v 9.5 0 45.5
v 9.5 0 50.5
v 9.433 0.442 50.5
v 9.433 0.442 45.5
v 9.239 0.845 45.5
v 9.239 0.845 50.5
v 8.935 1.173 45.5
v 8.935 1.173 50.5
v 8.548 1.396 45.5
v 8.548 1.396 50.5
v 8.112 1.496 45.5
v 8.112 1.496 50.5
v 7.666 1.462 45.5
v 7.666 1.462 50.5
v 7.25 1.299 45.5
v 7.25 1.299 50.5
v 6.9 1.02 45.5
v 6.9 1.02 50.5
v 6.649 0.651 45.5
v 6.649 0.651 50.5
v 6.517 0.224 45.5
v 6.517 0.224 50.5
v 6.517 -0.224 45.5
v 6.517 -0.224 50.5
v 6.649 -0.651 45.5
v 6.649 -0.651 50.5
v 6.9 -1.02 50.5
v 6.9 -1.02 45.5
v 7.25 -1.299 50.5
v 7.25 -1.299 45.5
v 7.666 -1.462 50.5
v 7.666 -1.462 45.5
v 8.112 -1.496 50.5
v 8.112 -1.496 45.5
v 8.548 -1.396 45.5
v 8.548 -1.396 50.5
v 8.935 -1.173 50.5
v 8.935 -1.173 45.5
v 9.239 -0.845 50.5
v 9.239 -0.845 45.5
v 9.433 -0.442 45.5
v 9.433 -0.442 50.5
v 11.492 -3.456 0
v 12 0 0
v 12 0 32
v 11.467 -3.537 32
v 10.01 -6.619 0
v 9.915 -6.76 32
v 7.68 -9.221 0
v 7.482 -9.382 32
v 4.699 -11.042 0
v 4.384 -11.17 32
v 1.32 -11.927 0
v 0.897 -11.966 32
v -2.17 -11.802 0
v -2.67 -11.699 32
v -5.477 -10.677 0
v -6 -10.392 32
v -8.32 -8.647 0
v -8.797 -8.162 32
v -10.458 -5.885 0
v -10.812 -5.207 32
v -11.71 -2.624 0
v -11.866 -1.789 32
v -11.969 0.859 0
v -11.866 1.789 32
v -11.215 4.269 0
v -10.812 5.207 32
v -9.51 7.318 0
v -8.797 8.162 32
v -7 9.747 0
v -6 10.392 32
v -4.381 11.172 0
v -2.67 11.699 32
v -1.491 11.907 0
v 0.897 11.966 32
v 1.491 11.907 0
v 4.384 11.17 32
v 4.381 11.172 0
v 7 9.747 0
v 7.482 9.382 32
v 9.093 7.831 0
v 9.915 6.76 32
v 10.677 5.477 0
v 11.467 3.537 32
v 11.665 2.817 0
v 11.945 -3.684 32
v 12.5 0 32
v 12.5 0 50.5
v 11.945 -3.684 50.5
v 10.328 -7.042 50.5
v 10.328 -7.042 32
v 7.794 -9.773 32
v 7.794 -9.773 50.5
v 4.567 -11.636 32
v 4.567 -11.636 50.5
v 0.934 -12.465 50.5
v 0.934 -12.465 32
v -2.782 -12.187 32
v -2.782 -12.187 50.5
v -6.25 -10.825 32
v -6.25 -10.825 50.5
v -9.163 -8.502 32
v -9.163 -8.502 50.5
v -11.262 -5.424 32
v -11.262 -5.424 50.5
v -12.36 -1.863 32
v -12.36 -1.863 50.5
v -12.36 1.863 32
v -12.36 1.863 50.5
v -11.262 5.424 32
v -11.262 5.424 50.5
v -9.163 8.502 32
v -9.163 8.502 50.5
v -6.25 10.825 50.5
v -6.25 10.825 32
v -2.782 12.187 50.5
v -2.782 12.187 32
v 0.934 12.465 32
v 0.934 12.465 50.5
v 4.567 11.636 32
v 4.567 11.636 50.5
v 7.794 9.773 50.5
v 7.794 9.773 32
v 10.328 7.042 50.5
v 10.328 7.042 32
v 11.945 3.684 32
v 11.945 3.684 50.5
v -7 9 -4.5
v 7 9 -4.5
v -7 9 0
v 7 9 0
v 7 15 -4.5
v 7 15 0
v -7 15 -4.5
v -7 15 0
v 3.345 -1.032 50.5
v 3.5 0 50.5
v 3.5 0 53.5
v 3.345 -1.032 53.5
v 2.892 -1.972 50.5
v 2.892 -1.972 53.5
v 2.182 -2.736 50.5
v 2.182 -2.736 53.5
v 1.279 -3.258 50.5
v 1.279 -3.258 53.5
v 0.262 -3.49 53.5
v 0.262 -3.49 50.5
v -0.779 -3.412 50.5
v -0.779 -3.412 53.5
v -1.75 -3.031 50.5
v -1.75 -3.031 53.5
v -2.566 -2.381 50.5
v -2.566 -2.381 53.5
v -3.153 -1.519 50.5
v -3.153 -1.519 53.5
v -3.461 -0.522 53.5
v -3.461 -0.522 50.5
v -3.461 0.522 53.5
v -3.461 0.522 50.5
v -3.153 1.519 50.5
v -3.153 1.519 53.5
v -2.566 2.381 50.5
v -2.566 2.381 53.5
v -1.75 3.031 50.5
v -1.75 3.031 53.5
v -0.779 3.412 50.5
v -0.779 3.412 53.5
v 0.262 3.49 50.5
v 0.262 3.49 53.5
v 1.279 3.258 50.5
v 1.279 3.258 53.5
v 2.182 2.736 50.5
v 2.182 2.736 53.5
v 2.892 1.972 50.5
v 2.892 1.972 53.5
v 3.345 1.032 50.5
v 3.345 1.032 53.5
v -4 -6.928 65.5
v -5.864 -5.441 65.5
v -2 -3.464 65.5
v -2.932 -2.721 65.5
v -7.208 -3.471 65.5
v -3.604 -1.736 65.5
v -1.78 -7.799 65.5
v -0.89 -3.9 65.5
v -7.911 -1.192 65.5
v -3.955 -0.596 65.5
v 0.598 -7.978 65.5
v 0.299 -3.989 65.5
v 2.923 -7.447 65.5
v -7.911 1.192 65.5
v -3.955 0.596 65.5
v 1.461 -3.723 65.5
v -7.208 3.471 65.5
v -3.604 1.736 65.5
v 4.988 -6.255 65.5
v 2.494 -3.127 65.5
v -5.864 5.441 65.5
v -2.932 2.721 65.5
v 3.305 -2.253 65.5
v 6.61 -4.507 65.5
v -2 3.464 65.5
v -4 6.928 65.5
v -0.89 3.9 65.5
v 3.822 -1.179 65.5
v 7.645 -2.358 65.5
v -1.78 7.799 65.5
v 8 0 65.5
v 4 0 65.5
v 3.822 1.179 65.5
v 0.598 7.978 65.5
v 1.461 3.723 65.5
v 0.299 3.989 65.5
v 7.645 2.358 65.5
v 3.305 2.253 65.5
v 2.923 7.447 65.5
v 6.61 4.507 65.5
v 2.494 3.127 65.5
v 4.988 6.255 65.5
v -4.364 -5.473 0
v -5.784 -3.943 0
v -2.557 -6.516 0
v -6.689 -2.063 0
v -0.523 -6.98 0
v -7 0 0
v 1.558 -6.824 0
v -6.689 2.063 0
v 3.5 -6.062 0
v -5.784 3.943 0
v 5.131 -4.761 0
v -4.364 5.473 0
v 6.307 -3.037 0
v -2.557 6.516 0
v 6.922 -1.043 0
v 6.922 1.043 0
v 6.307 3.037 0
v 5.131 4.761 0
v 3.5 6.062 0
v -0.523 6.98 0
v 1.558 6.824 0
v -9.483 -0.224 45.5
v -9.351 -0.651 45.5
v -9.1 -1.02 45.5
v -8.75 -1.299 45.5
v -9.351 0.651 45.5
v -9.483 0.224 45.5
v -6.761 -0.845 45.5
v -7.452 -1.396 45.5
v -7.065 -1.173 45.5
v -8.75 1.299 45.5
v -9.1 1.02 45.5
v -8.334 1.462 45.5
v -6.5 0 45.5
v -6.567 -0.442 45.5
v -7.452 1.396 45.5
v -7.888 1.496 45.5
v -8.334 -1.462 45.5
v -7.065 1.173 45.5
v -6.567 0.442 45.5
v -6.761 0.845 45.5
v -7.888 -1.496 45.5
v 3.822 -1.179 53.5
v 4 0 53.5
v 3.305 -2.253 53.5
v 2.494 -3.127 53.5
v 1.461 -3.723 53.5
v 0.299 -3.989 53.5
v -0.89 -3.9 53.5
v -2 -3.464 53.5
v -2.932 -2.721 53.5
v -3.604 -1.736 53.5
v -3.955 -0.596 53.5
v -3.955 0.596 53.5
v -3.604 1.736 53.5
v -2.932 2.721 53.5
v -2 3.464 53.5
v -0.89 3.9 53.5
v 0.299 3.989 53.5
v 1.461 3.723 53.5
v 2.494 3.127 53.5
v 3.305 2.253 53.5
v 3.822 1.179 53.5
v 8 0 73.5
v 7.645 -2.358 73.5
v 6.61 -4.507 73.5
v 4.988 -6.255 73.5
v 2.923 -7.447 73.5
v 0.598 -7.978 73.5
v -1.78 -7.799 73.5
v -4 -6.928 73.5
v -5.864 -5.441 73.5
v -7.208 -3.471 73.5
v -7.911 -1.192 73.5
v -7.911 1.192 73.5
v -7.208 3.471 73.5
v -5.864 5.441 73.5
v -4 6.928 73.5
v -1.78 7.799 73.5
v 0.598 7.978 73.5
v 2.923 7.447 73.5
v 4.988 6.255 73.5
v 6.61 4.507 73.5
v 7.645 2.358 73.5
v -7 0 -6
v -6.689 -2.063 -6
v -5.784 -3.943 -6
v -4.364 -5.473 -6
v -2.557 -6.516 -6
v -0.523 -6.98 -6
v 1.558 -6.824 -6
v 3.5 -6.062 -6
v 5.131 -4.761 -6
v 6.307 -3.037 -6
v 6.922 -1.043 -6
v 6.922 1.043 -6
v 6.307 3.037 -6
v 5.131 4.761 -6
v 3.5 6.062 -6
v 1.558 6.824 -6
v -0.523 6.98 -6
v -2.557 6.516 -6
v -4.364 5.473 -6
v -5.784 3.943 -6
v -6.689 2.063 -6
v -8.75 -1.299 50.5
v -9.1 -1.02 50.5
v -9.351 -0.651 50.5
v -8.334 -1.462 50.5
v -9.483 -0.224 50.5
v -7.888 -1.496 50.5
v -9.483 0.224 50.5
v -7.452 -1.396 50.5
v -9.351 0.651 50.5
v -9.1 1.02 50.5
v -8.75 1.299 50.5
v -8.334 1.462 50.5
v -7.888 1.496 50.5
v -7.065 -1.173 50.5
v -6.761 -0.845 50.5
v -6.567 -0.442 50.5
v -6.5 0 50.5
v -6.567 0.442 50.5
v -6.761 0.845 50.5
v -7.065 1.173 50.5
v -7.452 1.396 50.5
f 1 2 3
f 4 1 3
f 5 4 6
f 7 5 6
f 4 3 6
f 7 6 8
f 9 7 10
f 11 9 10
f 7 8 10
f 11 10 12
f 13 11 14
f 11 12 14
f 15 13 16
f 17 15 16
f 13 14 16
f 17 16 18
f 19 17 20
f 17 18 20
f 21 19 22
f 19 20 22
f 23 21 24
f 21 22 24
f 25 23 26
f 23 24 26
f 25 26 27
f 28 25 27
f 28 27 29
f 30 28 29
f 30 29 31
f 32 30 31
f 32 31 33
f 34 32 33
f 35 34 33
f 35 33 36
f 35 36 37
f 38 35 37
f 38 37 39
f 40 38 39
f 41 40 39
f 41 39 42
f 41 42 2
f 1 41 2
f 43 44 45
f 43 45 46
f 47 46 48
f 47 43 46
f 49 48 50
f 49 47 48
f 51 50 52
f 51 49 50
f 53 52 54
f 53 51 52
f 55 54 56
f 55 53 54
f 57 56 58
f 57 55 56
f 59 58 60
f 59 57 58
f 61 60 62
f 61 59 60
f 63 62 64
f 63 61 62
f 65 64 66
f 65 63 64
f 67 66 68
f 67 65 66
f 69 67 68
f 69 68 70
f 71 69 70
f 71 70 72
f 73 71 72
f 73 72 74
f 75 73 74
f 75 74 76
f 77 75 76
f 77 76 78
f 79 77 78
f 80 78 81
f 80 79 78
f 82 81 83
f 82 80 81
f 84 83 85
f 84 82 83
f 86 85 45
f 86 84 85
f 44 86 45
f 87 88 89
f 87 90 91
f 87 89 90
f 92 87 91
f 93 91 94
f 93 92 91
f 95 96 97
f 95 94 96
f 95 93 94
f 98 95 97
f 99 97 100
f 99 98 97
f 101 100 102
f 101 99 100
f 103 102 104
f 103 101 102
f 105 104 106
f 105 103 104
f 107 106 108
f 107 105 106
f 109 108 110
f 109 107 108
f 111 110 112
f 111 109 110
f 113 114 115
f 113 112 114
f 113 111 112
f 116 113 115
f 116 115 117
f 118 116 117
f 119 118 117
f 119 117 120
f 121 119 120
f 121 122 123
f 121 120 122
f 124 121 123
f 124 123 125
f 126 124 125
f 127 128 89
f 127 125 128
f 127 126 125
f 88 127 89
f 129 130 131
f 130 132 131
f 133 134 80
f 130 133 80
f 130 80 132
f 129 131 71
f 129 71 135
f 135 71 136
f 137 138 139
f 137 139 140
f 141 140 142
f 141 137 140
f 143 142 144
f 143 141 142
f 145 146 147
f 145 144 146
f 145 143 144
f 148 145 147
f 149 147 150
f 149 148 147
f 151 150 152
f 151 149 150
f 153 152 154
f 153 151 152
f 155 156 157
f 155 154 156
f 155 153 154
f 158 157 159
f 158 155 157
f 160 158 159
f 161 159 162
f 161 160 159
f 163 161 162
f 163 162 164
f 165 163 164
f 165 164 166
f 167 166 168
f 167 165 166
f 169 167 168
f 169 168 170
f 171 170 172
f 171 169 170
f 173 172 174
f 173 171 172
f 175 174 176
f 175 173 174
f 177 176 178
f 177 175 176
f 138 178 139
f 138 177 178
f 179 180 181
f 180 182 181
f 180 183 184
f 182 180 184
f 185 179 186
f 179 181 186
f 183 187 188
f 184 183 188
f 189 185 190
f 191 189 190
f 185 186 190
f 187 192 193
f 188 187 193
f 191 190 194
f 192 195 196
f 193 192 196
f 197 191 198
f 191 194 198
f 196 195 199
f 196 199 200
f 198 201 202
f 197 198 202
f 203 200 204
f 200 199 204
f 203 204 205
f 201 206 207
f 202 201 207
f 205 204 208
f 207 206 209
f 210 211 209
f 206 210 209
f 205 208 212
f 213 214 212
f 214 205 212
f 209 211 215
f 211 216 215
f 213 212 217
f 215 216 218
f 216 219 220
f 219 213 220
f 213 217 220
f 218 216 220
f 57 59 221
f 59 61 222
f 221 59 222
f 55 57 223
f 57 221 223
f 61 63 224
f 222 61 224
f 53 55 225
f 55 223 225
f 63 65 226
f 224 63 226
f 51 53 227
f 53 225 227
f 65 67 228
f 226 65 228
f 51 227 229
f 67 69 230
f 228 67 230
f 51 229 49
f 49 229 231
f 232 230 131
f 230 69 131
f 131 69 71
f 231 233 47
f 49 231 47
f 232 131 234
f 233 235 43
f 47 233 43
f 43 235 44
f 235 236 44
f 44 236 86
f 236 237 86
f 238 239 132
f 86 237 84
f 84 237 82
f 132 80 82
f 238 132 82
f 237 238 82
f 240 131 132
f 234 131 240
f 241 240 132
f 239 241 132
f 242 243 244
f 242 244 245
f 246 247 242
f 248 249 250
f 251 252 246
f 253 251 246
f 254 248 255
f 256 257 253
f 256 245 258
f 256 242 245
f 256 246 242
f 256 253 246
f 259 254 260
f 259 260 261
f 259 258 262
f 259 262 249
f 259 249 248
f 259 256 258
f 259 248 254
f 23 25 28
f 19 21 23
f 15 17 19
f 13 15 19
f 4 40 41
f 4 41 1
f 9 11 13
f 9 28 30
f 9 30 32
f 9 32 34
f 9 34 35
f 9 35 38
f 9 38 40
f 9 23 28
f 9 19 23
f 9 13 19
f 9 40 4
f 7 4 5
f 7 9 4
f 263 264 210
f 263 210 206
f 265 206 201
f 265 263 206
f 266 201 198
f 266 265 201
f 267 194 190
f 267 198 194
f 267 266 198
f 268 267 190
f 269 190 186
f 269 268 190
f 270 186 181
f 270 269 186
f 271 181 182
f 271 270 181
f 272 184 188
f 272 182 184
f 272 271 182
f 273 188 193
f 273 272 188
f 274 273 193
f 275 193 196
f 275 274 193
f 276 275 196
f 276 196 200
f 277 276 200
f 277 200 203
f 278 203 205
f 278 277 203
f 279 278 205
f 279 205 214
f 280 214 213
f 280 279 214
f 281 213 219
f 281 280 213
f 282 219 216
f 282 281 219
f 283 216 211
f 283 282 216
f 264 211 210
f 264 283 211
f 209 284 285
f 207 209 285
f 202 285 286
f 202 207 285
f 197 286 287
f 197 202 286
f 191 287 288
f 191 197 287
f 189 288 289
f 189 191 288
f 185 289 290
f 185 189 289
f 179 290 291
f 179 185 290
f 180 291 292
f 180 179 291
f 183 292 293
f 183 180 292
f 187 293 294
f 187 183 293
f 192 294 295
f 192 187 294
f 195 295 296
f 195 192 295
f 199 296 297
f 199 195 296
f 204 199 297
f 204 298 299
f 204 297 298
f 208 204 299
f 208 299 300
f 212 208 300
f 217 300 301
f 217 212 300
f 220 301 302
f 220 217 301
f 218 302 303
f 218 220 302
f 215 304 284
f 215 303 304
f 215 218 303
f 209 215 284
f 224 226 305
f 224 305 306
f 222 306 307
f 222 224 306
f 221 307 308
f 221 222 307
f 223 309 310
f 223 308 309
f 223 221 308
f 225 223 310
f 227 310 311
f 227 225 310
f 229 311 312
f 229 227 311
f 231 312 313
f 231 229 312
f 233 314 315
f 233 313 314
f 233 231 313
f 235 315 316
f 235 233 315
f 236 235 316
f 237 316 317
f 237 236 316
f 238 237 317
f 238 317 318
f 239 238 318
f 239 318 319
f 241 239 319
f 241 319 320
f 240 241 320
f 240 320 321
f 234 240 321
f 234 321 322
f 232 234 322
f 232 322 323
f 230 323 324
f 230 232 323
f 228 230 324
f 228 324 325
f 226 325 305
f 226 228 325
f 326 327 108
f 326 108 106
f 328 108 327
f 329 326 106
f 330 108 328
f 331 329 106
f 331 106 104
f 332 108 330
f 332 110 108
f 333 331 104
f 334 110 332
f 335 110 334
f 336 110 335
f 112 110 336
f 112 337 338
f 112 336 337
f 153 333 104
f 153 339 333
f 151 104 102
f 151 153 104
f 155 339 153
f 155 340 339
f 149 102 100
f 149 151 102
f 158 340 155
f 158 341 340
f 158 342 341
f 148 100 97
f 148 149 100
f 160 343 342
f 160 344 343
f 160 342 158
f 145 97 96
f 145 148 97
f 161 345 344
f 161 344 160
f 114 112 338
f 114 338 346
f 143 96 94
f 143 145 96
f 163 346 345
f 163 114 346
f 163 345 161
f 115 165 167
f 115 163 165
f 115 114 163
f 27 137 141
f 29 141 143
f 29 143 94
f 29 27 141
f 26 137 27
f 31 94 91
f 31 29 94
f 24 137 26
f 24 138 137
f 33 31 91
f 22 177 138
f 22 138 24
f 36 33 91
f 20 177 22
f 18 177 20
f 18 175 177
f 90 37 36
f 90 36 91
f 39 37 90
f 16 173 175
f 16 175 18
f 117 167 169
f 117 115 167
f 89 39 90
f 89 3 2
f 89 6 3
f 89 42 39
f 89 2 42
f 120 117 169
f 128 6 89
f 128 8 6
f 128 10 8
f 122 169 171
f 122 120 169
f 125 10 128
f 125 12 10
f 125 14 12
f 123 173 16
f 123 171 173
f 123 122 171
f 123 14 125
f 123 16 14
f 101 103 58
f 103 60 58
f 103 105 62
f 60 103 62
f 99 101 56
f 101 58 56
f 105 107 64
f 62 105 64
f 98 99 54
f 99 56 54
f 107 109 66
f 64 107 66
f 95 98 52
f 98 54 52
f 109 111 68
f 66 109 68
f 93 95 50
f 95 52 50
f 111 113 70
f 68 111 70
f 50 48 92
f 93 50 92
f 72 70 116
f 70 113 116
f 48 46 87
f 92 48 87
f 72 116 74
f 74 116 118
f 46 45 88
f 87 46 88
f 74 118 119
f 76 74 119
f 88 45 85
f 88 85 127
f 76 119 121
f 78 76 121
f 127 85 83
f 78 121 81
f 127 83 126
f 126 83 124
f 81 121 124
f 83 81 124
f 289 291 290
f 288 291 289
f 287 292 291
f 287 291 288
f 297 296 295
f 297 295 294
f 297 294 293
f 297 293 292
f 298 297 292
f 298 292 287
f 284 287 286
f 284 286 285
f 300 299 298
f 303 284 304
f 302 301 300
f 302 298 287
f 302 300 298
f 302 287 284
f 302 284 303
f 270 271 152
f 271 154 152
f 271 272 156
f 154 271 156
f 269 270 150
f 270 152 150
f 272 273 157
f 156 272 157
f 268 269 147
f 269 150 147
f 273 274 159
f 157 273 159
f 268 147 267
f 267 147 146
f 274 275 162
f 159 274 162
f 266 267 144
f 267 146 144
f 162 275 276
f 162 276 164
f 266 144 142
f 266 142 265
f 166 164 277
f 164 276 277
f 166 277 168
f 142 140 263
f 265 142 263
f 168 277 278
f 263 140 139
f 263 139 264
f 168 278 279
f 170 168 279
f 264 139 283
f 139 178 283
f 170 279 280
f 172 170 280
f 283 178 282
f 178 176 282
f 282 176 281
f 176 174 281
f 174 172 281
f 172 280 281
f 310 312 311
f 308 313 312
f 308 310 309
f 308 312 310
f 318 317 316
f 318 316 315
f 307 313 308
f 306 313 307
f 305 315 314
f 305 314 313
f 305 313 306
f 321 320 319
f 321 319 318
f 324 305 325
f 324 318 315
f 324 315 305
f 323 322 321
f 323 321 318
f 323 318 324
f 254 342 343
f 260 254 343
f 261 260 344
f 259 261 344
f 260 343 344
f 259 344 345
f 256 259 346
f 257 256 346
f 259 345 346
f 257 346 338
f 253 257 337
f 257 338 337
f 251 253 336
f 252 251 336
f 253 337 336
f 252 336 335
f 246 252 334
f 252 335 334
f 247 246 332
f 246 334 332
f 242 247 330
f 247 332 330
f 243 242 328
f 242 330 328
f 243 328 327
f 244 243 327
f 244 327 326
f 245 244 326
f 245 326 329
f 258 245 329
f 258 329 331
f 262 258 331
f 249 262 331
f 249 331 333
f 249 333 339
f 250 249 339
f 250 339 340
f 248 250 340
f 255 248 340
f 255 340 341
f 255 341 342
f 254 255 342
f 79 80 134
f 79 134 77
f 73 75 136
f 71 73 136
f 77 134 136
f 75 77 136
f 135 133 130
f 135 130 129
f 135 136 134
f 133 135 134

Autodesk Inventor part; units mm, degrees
ref_plane "YZ Plane" through (0, 0, 0) normal (1, 0, 0) x (0, 1, 0)
ref_plane "XZ Plane" through (0, 0, 0) normal (0, 1, 0) x (-1, 0, 0)
ref_plane "XY Plane" through (0, 0, 0) normal (0, 0, 1) x (1, 0, 0)
sketch "Sketch1" plane through (0, 0, 0) normal (0, 0, 1) x (1, 0, 0)
  circle A0 centre (0, 0) radius 12
  dimension "d0" = 24
extrude "Extrusion1" add sketch "Sketch1" along normal blind 32
sketch "Sketch2" plane through (0, 0, 32) normal (0, 0, 1) x (1, 0, 0)
  circle A0 centre (0, 0) radius 12.5
  dimension "d3" = 25
sketch "Sketch3" plane through (0, 0, 32) normal (0, 0, 1) x (1, 0, 0)
  point P0 (0, 0)
extrude "Extrusion2" add sketch "Sketch2" along normal blind 18.5
sketch "Sketch4" plane through (0, 0, 50.5) normal (0, 0, 1) x (1, 0, 0)
  circle A0 centre (0, 0) radius 3.5
  dimension "d6" = 7
extrude "Extrusion3" add sketch "Sketch4" along normal blind 3
sketch "Sketch7" plane through (0, 0, 0) normal (0, 0, -1) x (-1, 0, 0)
  circle A0 centre (0, 0) radius 7
  dimension "d15" = 14
extrude "Extrusion6" add sketch "Sketch7" along normal blind 6
sketch "Sketch8" plane through (0, 0, 0) normal (0, 0, -1) x (-1, 0, 0)
  circle A0 centre (0, 0) radius 12 projected
  line L0 (0, 9) -> (7, 9)
  line L1 (7, 9) -> (7, 15)
  line L2 (7, 15) -> (-7, 15)
  line L3 (-7, 15) -> (-7, 9)
  line L4 (-7, 9) -> (0, 9)
  dimension "d20" = 7
  dimension "d21" = 14
extrude "Extrusion7" add sketch "Sketch8" along normal blind 4.5 contours L1 L0 L4 L3 A0 | A0 L3 L2 L1 picked at (-3.7936, 9.7239)
sketch "Sketch9" plane through (0, 0, 50.5) normal (0, 0, 1) x (1, 0, 0)
  circle A0 centre (-8, 0) radius 1.5
  circle A1 centre (8, 0) radius 1.5
  point P0 (0, 0)
  dimension "d24" = 3
  dimension "d25" = 8
  dimension "d26" = 3
  dimension "d27" = 8
extrude "Extrusion8" cut sketch "Sketch9" against normal blind 5
sketch "Sketch10" plane through (0, 0, 53.5) normal (0, 0, 1) x (1, 0, 0)
  circle A0 centre (0, 0) radius 4
  dimension "d30" = 8
extrude "Extrusion9" add sketch "Sketch10" along normal blind 12
sketch "Sketch11" plane through (0, 0, 65.5) normal (0, 0, 1) x (1, 0, 0)
  circle A0 centre (0, 0) radius 7 projected
  circle A1 centre (0, 0) radius 8
  dimension "d33" = 16
extrude "Extrusion10" add sketch "Sketch11" along normal blind 8 contours A0 | A1
properties part number "Motor_Place_Holder"
